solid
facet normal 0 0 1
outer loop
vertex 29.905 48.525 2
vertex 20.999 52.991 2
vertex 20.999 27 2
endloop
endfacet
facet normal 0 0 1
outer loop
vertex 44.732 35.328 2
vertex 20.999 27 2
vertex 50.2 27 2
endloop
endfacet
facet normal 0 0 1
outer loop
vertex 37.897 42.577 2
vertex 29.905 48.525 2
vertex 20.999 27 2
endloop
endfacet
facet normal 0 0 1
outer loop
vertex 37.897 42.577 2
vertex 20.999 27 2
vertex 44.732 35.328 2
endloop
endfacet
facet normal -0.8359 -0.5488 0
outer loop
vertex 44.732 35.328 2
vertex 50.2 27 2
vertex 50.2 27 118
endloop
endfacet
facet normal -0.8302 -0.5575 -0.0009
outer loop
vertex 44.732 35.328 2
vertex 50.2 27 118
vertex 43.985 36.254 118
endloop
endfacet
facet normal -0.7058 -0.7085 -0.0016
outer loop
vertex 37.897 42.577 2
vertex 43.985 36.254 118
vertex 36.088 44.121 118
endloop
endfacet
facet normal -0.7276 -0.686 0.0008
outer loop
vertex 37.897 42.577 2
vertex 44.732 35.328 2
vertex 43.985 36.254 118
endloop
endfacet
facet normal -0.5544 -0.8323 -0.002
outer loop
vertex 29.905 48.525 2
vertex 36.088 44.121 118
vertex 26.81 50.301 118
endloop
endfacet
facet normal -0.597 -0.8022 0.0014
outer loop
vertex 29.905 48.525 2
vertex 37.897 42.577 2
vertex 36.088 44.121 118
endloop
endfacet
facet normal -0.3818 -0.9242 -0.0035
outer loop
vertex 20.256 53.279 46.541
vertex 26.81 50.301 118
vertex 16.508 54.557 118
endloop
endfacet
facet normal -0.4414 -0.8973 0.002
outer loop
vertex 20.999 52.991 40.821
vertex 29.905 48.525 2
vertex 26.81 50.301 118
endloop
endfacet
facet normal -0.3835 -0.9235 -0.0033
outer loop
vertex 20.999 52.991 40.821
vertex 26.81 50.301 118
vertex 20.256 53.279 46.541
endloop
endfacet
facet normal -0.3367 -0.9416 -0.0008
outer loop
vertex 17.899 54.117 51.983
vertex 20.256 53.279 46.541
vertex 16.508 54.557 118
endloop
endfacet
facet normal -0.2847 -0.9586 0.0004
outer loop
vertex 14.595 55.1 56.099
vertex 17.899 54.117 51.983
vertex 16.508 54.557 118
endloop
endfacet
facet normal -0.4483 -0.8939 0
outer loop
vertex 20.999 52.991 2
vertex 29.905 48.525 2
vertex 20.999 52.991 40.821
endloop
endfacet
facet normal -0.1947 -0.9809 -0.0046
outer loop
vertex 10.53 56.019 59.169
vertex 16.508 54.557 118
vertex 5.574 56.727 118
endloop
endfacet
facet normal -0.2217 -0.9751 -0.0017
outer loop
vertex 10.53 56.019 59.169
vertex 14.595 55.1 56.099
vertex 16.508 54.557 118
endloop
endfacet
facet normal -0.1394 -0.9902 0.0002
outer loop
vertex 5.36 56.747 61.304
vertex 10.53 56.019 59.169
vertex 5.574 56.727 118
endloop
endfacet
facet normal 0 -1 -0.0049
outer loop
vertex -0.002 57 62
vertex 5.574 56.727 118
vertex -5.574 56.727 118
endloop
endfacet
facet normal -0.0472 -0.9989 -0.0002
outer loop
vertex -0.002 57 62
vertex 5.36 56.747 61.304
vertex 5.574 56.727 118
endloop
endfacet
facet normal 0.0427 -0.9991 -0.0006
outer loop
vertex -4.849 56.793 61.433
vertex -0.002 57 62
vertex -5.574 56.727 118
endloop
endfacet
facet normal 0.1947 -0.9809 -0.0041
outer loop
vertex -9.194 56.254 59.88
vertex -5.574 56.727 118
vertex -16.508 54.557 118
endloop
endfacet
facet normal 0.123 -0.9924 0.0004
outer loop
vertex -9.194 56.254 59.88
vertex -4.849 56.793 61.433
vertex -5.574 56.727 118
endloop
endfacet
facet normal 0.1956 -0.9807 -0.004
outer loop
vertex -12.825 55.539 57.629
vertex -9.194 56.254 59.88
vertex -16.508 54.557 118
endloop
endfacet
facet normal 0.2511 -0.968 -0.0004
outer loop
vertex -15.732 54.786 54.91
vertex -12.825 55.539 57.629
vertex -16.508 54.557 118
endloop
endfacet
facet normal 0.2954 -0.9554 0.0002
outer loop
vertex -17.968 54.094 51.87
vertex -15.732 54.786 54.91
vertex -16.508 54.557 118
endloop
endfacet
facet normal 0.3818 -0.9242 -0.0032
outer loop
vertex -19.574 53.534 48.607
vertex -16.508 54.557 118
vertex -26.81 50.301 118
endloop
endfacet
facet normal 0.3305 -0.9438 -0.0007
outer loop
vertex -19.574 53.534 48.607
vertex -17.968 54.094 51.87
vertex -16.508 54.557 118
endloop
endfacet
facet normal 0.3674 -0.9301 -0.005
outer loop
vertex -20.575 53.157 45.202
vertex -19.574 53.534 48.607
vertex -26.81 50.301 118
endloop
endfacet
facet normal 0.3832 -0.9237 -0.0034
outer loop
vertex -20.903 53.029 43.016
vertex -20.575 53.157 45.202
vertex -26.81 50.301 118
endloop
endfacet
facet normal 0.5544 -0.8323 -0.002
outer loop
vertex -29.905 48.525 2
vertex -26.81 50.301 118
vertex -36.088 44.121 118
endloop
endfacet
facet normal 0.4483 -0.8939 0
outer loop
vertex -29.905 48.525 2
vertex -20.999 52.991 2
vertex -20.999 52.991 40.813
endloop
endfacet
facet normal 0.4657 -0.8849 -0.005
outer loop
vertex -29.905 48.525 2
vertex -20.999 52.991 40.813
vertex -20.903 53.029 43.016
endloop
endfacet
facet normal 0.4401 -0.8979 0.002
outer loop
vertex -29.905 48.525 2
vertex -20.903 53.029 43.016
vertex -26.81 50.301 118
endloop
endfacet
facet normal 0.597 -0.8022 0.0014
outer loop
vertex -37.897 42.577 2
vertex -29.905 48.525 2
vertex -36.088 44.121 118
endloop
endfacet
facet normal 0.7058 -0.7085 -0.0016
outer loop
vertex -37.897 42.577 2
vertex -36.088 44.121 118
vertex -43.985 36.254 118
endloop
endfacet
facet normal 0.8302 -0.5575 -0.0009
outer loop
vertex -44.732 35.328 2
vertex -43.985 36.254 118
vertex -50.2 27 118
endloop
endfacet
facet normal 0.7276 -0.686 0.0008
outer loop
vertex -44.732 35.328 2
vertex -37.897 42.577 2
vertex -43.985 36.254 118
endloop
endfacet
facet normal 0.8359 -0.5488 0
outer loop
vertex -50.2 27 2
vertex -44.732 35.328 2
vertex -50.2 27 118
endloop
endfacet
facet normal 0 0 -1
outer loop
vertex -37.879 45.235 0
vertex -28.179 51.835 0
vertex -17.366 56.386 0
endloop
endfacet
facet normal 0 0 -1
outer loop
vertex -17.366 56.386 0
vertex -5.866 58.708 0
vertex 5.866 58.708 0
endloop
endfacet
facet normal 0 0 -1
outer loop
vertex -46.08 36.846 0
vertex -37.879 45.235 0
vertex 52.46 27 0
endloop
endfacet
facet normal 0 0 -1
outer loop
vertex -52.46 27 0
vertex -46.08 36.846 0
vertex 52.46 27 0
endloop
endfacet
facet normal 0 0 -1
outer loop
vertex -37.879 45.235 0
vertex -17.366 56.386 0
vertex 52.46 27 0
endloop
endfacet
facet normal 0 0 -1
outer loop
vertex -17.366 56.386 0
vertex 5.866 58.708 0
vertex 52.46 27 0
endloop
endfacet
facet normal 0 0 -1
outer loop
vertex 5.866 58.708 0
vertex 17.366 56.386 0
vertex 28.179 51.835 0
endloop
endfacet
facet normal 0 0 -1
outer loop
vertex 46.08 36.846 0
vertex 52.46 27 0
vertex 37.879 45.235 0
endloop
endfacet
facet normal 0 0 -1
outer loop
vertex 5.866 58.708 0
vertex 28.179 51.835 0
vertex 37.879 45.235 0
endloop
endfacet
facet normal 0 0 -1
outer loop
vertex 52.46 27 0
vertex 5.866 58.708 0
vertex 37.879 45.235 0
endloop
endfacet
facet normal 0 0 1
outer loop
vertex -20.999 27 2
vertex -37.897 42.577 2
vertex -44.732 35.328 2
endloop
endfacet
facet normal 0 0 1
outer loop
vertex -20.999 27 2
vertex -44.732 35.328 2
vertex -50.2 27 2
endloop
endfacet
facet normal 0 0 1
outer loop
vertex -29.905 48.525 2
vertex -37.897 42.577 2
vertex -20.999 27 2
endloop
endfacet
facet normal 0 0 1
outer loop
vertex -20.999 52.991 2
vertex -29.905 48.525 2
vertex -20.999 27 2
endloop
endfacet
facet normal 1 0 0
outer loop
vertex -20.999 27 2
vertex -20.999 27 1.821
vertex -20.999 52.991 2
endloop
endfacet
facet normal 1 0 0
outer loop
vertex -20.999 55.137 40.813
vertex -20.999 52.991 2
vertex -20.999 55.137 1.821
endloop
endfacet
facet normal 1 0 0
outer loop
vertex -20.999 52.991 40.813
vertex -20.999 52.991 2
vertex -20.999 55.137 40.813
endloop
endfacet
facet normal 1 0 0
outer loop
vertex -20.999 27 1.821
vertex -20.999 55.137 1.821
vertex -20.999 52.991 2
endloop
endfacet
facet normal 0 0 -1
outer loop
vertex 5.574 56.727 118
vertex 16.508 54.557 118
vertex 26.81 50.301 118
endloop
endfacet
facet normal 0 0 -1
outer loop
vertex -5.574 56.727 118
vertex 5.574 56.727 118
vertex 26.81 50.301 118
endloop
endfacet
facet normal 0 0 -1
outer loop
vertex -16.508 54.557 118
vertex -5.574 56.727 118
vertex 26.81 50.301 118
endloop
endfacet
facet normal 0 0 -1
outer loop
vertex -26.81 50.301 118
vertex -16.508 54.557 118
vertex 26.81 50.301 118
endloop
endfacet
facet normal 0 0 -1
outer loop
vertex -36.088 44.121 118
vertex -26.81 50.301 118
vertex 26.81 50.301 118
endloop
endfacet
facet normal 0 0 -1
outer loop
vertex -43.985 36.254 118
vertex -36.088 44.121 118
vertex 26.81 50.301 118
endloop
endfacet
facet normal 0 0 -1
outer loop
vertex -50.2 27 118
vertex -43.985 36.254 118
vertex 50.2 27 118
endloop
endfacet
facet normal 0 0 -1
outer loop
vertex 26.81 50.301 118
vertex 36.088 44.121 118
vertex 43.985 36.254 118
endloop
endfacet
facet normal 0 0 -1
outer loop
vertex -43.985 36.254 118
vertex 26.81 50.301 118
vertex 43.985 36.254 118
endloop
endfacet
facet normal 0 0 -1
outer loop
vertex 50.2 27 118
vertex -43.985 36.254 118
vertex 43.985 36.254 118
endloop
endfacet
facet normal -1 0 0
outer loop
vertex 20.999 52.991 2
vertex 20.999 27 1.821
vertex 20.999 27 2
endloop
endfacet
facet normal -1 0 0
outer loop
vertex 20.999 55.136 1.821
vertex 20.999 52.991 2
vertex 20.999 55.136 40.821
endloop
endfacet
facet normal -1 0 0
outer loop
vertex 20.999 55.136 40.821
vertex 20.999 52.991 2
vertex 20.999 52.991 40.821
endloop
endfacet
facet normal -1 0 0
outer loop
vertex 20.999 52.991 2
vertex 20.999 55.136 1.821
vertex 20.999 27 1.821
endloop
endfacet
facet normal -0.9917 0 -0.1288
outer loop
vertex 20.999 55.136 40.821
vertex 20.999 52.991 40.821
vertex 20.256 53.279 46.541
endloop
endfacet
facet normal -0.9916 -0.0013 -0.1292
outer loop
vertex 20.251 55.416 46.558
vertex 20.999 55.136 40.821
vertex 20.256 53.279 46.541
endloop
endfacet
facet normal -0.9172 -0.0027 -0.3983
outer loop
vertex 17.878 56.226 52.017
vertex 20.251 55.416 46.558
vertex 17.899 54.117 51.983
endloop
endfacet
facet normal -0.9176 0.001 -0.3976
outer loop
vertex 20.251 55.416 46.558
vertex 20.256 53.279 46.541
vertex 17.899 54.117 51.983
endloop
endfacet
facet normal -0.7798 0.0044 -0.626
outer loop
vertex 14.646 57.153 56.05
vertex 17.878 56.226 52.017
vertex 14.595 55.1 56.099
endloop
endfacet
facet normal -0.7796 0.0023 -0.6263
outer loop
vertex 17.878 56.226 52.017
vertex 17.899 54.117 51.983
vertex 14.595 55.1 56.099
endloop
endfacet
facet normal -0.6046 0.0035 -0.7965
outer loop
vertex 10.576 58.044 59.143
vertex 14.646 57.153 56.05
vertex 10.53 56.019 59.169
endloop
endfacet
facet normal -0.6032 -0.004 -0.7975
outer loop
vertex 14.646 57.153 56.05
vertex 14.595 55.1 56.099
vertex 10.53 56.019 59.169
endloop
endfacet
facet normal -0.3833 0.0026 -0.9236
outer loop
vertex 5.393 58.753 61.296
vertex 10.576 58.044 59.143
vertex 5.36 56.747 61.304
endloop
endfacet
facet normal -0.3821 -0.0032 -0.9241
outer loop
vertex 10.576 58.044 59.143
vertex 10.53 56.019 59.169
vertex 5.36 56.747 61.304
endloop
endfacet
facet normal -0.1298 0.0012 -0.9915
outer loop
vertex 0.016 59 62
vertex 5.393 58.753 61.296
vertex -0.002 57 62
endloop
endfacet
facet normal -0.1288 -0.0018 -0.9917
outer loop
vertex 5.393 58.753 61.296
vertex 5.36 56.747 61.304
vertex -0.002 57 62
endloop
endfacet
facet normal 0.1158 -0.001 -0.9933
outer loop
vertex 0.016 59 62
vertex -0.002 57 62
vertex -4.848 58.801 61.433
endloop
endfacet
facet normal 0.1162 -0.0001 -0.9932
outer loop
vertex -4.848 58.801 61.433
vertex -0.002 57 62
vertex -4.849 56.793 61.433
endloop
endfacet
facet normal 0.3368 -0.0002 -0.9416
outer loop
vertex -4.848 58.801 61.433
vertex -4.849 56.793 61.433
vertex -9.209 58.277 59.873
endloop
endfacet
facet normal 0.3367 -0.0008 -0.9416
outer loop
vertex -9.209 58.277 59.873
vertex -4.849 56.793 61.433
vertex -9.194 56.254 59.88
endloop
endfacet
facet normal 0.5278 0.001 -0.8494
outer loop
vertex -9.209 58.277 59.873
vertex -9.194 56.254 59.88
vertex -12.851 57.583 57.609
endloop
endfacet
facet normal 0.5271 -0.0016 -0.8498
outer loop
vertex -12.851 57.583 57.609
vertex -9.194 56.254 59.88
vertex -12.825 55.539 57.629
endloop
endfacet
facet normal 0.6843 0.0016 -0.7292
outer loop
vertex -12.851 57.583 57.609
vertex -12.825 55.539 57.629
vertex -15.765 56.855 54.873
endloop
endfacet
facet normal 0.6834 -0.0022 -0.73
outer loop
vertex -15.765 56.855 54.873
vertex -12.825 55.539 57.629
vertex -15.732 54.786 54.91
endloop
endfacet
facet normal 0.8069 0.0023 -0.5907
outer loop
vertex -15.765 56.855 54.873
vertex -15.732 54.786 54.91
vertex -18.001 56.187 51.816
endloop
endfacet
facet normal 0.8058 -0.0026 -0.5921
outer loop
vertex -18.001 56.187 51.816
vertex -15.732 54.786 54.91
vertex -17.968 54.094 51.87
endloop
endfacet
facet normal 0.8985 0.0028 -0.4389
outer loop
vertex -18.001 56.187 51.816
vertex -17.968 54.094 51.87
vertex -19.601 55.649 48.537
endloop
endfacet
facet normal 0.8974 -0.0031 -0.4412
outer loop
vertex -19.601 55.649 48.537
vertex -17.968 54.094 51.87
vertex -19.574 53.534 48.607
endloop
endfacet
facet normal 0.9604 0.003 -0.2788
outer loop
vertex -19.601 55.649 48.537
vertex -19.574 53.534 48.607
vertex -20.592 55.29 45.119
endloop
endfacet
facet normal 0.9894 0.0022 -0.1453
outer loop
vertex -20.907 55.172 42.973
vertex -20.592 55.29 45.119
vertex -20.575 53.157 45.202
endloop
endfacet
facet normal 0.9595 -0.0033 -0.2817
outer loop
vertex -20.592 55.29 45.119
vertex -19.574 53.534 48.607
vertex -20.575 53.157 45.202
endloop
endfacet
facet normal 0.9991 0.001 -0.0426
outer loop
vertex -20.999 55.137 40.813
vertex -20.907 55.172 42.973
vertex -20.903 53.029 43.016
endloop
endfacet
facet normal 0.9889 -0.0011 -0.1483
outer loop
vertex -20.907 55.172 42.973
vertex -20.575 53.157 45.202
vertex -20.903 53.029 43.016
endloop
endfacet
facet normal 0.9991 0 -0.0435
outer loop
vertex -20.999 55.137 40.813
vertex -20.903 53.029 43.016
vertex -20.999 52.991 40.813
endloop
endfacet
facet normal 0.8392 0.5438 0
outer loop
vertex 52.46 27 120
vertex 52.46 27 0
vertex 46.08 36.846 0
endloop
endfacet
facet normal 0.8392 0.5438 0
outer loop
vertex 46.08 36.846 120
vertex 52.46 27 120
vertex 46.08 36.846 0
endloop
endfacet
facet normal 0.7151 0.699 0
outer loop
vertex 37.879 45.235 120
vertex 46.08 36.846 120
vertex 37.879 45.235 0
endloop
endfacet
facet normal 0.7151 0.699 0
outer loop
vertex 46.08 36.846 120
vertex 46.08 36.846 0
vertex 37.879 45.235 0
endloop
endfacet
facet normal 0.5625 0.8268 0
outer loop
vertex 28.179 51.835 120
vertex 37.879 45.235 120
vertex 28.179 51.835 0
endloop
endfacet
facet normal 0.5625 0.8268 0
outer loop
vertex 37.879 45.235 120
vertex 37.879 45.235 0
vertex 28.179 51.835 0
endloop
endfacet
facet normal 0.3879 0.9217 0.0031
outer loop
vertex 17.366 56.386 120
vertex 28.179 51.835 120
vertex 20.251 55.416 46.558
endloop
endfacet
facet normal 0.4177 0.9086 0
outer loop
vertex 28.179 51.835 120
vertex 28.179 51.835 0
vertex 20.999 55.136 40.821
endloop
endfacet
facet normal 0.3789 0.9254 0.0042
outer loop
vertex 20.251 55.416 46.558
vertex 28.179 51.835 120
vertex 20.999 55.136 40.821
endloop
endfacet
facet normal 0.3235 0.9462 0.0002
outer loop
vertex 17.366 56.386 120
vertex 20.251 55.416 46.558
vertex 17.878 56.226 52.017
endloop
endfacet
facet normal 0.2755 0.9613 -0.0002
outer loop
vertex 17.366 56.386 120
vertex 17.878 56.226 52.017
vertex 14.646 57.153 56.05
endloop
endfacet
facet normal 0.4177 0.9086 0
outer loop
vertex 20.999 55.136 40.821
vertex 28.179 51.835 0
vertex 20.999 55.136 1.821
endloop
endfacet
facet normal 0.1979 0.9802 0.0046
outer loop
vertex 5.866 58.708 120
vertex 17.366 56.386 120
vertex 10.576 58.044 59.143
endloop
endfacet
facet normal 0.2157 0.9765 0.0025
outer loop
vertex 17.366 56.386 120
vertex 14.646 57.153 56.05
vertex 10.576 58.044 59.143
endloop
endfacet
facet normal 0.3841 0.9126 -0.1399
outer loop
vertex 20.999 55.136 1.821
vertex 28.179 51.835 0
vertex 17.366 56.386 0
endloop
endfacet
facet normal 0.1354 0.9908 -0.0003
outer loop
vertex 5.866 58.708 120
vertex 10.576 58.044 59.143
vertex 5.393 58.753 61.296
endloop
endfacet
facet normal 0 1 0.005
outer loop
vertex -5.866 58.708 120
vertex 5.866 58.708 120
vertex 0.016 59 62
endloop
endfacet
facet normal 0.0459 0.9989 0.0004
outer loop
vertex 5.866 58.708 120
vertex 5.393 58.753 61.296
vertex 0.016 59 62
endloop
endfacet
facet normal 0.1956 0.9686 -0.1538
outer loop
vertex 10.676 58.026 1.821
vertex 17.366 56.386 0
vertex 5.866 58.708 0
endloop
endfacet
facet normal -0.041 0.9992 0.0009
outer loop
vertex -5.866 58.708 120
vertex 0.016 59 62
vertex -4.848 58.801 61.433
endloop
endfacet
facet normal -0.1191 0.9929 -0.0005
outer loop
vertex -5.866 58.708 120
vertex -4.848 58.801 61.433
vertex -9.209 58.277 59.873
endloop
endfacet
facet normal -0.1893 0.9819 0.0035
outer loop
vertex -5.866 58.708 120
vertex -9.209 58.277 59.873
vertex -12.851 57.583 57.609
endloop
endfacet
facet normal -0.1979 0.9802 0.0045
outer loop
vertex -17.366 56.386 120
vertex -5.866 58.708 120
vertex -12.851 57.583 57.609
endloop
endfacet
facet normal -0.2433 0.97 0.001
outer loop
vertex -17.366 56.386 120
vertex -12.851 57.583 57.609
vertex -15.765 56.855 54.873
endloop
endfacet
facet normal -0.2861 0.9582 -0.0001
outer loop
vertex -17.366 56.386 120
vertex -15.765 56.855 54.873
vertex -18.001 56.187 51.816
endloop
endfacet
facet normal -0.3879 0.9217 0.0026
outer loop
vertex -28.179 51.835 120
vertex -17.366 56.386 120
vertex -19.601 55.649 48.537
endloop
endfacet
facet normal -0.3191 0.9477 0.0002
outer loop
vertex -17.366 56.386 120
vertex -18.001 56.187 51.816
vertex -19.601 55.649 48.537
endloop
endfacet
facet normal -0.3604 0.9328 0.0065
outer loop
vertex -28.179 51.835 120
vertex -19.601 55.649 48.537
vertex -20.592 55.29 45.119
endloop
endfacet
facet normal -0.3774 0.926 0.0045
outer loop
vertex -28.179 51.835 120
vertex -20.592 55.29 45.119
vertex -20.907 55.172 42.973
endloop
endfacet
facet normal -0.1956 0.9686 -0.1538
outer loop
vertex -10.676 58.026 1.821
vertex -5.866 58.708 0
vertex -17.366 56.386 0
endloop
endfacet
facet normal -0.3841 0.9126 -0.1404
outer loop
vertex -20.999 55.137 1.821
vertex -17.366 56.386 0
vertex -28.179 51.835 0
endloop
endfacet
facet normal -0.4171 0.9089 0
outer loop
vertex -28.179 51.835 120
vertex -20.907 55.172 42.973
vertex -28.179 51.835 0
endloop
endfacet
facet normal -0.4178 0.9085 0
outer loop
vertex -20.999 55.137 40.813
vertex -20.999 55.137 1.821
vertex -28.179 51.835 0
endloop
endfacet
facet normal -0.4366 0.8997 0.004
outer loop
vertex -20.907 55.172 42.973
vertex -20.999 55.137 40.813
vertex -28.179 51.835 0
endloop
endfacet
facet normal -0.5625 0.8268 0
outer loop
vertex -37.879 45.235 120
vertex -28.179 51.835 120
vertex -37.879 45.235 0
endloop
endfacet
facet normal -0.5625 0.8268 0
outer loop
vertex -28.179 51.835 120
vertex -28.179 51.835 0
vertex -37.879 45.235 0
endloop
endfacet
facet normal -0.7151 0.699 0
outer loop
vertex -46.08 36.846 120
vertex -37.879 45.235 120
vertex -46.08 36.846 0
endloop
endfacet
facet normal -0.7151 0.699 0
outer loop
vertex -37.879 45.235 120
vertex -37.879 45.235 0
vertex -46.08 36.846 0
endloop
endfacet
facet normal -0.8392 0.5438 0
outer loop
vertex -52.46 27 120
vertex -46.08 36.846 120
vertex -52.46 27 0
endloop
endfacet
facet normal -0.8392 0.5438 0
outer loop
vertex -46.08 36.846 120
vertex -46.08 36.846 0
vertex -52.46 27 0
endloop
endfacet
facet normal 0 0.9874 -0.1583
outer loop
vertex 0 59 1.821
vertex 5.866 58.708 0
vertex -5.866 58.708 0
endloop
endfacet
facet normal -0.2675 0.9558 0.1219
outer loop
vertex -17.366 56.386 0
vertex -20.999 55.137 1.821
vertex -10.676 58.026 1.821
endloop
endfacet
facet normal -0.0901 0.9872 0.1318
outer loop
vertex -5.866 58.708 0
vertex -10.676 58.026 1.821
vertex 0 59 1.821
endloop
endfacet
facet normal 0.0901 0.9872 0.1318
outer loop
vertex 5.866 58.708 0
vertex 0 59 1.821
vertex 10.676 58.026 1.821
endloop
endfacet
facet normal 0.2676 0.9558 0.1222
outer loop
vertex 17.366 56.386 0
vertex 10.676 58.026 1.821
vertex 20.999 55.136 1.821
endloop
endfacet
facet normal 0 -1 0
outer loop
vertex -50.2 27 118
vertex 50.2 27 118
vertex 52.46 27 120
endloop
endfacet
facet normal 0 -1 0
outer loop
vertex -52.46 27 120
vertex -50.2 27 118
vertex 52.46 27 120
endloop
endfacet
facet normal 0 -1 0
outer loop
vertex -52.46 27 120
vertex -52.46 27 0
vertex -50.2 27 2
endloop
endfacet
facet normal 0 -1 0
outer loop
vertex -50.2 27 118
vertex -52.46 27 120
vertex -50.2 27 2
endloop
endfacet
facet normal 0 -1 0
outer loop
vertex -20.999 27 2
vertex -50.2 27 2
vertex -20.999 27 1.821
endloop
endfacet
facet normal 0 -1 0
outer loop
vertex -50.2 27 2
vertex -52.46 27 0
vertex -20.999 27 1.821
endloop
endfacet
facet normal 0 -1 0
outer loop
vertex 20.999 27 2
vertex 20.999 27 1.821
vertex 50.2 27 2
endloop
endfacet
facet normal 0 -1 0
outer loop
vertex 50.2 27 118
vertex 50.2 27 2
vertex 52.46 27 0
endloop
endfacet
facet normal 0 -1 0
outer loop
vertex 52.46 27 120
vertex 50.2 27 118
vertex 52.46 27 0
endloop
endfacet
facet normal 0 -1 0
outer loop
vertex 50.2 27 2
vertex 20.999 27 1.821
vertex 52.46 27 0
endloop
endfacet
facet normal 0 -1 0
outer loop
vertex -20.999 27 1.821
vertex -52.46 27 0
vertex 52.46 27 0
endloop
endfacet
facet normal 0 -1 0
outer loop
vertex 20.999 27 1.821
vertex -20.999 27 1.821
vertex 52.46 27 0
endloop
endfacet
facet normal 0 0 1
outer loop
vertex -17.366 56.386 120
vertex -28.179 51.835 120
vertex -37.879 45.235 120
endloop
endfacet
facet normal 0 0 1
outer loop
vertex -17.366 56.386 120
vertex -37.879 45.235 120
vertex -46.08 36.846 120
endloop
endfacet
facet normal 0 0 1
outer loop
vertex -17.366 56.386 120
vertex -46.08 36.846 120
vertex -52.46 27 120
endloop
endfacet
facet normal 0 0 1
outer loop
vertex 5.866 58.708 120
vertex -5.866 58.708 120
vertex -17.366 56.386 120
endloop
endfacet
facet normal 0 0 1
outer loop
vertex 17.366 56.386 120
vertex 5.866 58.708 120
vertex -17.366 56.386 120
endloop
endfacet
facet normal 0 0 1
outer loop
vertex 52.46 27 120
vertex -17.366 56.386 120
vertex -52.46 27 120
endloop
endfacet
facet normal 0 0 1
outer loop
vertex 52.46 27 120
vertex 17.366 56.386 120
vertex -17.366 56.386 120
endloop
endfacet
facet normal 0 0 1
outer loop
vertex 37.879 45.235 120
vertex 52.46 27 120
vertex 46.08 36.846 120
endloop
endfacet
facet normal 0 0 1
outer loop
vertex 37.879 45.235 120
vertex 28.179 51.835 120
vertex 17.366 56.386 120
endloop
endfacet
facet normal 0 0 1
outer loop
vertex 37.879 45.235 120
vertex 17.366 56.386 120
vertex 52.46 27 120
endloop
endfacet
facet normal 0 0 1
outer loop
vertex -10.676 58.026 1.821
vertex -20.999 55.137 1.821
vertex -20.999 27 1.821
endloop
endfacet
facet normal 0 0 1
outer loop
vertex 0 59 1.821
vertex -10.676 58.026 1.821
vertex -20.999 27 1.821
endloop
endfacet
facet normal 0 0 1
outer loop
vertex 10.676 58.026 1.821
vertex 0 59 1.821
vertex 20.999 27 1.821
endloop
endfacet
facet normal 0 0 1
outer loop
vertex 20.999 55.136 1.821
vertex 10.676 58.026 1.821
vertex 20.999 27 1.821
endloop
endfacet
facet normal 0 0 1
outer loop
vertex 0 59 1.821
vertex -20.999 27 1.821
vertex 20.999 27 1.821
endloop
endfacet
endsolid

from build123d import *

# Parameters (mm, degrees)
PAD_DEPTH    = 120
PAD001_DEPTH = 2
PAD002_DEPTH = 2
POCKET_DEPTH = 59.001


with BuildPart() as part:
    # Sketch → Pad (new body)
    with BuildSketch(Plane.XY):
        with BuildLine():
            ThreePointArc((52.459508, 27), (0, 59), (-52.459508, 27))
            Line((-52.459508, 27), (-50.199602, 27))
            ThreePointArc((50.199602, 27), (0, 57), (-50.199602, 27))
            Line((50.199602, 27), (52.459508, 27))
        make_face()
    extrude(amount=PAD_DEPTH)

    # Sketch001 → Pad001 (join)
    with BuildSketch(Plane.XY):
        with BuildLine():
            ThreePointArc((50.199602, 27), (0, 57), (-50.199602, 27))
            Line((-50.199602, 27), (50.199602, 27))
        make_face()
    extrude(amount=PAD001_DEPTH)

    # Sketch002 → Pad002 (join)
    with BuildSketch(Plane.XY.offset(118)):
        with BuildLine():
            ThreePointArc((50.199602, 27), (0, 57), (-50.199602, 27))
            Line((-50.199602, 27), (50.199602, 27))
        make_face()
    extrude(amount=PAD002_DEPTH)

    # Sketch003 → Pocket (cut, through all)
    with BuildSketch(Plane.XZ):
        with BuildLine():
            Line((-20.999165, 1.820858), (20.999236, 1.820858))
            Line((20.999236, 1.820858), (20.999236, 40.820858))
            ThreePointArc((20.999236, 40.820858), (-0.004079, 62), (-20.999165, 40.8127))
            Line((-20.999165, 1.820858), (-20.999165, 40.8127))
        make_face()
    extrude(amount=-POCKET_DEPTH, mode=Mode.SUBTRACT)


solid = part.part
